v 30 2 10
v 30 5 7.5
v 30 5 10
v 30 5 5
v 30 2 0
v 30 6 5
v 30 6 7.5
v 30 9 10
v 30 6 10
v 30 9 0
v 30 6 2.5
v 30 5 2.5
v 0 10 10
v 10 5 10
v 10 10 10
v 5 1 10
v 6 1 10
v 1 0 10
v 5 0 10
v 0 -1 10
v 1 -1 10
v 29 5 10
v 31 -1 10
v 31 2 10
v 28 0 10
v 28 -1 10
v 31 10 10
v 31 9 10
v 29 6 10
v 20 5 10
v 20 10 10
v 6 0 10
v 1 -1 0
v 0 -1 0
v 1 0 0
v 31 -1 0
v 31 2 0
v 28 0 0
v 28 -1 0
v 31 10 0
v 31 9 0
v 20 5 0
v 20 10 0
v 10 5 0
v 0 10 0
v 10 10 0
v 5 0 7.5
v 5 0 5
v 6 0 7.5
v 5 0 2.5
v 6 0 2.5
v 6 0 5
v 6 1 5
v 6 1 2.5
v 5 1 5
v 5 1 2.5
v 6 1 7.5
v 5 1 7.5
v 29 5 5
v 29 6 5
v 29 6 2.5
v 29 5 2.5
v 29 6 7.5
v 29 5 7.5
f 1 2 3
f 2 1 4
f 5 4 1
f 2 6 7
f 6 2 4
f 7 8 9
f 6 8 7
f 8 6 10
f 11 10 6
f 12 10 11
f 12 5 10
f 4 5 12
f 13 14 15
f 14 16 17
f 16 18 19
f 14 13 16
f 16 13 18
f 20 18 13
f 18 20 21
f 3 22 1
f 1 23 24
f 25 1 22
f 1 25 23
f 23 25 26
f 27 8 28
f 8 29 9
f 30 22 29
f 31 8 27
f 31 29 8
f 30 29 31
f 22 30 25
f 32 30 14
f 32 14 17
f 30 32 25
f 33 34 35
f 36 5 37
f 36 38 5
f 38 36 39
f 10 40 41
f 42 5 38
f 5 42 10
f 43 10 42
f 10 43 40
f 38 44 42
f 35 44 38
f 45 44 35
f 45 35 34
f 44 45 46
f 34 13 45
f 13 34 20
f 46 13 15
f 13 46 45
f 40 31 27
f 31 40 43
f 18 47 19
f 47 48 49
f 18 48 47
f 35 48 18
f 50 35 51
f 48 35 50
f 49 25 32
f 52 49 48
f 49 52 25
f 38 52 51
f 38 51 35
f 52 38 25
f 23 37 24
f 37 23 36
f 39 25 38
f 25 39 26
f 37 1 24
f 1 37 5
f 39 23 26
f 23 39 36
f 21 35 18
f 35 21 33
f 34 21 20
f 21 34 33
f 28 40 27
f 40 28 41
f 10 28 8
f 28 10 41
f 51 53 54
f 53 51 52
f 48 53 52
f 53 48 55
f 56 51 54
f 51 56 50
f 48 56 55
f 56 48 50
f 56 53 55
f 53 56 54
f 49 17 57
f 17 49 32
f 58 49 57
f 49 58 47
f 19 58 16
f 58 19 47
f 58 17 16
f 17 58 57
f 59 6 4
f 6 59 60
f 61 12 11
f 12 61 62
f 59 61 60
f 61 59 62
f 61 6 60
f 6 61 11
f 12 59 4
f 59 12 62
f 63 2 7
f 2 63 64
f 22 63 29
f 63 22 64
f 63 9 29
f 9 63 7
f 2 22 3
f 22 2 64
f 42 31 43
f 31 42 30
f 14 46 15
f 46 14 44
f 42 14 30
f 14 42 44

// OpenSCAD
//
xx = 10;
zz = 10;

pinz = 2.5;
pinx= 1;


difference() {
    union() {
        cube([xx*3,xx,zz]);
        translate([xx*3-2,-1,0]) cube([3,3,zz]);
        translate([0,-1,0]) cube([1,2,zz]);
        translate([xx*3-1,xx-1,0]) cube([2,1,zz]);
        
    }
    translate([xx/2,0,pinz]) cube([pinx,pinx,pinz]);
    translate([xx/2,0,pinz*3]) cube([pinx,pinx,pinz]);
    
    translate([xx*3-pinx,xx/2,pinz]) cube([pinx,pinx,pinz]);
    translate([xx*3-pinx,xx/2,pinz*3]) cube([pinx,pinx,pinz]);
    
    translate([xx,xx/2,0]) cube([xx,xx,zz]);
    
}
